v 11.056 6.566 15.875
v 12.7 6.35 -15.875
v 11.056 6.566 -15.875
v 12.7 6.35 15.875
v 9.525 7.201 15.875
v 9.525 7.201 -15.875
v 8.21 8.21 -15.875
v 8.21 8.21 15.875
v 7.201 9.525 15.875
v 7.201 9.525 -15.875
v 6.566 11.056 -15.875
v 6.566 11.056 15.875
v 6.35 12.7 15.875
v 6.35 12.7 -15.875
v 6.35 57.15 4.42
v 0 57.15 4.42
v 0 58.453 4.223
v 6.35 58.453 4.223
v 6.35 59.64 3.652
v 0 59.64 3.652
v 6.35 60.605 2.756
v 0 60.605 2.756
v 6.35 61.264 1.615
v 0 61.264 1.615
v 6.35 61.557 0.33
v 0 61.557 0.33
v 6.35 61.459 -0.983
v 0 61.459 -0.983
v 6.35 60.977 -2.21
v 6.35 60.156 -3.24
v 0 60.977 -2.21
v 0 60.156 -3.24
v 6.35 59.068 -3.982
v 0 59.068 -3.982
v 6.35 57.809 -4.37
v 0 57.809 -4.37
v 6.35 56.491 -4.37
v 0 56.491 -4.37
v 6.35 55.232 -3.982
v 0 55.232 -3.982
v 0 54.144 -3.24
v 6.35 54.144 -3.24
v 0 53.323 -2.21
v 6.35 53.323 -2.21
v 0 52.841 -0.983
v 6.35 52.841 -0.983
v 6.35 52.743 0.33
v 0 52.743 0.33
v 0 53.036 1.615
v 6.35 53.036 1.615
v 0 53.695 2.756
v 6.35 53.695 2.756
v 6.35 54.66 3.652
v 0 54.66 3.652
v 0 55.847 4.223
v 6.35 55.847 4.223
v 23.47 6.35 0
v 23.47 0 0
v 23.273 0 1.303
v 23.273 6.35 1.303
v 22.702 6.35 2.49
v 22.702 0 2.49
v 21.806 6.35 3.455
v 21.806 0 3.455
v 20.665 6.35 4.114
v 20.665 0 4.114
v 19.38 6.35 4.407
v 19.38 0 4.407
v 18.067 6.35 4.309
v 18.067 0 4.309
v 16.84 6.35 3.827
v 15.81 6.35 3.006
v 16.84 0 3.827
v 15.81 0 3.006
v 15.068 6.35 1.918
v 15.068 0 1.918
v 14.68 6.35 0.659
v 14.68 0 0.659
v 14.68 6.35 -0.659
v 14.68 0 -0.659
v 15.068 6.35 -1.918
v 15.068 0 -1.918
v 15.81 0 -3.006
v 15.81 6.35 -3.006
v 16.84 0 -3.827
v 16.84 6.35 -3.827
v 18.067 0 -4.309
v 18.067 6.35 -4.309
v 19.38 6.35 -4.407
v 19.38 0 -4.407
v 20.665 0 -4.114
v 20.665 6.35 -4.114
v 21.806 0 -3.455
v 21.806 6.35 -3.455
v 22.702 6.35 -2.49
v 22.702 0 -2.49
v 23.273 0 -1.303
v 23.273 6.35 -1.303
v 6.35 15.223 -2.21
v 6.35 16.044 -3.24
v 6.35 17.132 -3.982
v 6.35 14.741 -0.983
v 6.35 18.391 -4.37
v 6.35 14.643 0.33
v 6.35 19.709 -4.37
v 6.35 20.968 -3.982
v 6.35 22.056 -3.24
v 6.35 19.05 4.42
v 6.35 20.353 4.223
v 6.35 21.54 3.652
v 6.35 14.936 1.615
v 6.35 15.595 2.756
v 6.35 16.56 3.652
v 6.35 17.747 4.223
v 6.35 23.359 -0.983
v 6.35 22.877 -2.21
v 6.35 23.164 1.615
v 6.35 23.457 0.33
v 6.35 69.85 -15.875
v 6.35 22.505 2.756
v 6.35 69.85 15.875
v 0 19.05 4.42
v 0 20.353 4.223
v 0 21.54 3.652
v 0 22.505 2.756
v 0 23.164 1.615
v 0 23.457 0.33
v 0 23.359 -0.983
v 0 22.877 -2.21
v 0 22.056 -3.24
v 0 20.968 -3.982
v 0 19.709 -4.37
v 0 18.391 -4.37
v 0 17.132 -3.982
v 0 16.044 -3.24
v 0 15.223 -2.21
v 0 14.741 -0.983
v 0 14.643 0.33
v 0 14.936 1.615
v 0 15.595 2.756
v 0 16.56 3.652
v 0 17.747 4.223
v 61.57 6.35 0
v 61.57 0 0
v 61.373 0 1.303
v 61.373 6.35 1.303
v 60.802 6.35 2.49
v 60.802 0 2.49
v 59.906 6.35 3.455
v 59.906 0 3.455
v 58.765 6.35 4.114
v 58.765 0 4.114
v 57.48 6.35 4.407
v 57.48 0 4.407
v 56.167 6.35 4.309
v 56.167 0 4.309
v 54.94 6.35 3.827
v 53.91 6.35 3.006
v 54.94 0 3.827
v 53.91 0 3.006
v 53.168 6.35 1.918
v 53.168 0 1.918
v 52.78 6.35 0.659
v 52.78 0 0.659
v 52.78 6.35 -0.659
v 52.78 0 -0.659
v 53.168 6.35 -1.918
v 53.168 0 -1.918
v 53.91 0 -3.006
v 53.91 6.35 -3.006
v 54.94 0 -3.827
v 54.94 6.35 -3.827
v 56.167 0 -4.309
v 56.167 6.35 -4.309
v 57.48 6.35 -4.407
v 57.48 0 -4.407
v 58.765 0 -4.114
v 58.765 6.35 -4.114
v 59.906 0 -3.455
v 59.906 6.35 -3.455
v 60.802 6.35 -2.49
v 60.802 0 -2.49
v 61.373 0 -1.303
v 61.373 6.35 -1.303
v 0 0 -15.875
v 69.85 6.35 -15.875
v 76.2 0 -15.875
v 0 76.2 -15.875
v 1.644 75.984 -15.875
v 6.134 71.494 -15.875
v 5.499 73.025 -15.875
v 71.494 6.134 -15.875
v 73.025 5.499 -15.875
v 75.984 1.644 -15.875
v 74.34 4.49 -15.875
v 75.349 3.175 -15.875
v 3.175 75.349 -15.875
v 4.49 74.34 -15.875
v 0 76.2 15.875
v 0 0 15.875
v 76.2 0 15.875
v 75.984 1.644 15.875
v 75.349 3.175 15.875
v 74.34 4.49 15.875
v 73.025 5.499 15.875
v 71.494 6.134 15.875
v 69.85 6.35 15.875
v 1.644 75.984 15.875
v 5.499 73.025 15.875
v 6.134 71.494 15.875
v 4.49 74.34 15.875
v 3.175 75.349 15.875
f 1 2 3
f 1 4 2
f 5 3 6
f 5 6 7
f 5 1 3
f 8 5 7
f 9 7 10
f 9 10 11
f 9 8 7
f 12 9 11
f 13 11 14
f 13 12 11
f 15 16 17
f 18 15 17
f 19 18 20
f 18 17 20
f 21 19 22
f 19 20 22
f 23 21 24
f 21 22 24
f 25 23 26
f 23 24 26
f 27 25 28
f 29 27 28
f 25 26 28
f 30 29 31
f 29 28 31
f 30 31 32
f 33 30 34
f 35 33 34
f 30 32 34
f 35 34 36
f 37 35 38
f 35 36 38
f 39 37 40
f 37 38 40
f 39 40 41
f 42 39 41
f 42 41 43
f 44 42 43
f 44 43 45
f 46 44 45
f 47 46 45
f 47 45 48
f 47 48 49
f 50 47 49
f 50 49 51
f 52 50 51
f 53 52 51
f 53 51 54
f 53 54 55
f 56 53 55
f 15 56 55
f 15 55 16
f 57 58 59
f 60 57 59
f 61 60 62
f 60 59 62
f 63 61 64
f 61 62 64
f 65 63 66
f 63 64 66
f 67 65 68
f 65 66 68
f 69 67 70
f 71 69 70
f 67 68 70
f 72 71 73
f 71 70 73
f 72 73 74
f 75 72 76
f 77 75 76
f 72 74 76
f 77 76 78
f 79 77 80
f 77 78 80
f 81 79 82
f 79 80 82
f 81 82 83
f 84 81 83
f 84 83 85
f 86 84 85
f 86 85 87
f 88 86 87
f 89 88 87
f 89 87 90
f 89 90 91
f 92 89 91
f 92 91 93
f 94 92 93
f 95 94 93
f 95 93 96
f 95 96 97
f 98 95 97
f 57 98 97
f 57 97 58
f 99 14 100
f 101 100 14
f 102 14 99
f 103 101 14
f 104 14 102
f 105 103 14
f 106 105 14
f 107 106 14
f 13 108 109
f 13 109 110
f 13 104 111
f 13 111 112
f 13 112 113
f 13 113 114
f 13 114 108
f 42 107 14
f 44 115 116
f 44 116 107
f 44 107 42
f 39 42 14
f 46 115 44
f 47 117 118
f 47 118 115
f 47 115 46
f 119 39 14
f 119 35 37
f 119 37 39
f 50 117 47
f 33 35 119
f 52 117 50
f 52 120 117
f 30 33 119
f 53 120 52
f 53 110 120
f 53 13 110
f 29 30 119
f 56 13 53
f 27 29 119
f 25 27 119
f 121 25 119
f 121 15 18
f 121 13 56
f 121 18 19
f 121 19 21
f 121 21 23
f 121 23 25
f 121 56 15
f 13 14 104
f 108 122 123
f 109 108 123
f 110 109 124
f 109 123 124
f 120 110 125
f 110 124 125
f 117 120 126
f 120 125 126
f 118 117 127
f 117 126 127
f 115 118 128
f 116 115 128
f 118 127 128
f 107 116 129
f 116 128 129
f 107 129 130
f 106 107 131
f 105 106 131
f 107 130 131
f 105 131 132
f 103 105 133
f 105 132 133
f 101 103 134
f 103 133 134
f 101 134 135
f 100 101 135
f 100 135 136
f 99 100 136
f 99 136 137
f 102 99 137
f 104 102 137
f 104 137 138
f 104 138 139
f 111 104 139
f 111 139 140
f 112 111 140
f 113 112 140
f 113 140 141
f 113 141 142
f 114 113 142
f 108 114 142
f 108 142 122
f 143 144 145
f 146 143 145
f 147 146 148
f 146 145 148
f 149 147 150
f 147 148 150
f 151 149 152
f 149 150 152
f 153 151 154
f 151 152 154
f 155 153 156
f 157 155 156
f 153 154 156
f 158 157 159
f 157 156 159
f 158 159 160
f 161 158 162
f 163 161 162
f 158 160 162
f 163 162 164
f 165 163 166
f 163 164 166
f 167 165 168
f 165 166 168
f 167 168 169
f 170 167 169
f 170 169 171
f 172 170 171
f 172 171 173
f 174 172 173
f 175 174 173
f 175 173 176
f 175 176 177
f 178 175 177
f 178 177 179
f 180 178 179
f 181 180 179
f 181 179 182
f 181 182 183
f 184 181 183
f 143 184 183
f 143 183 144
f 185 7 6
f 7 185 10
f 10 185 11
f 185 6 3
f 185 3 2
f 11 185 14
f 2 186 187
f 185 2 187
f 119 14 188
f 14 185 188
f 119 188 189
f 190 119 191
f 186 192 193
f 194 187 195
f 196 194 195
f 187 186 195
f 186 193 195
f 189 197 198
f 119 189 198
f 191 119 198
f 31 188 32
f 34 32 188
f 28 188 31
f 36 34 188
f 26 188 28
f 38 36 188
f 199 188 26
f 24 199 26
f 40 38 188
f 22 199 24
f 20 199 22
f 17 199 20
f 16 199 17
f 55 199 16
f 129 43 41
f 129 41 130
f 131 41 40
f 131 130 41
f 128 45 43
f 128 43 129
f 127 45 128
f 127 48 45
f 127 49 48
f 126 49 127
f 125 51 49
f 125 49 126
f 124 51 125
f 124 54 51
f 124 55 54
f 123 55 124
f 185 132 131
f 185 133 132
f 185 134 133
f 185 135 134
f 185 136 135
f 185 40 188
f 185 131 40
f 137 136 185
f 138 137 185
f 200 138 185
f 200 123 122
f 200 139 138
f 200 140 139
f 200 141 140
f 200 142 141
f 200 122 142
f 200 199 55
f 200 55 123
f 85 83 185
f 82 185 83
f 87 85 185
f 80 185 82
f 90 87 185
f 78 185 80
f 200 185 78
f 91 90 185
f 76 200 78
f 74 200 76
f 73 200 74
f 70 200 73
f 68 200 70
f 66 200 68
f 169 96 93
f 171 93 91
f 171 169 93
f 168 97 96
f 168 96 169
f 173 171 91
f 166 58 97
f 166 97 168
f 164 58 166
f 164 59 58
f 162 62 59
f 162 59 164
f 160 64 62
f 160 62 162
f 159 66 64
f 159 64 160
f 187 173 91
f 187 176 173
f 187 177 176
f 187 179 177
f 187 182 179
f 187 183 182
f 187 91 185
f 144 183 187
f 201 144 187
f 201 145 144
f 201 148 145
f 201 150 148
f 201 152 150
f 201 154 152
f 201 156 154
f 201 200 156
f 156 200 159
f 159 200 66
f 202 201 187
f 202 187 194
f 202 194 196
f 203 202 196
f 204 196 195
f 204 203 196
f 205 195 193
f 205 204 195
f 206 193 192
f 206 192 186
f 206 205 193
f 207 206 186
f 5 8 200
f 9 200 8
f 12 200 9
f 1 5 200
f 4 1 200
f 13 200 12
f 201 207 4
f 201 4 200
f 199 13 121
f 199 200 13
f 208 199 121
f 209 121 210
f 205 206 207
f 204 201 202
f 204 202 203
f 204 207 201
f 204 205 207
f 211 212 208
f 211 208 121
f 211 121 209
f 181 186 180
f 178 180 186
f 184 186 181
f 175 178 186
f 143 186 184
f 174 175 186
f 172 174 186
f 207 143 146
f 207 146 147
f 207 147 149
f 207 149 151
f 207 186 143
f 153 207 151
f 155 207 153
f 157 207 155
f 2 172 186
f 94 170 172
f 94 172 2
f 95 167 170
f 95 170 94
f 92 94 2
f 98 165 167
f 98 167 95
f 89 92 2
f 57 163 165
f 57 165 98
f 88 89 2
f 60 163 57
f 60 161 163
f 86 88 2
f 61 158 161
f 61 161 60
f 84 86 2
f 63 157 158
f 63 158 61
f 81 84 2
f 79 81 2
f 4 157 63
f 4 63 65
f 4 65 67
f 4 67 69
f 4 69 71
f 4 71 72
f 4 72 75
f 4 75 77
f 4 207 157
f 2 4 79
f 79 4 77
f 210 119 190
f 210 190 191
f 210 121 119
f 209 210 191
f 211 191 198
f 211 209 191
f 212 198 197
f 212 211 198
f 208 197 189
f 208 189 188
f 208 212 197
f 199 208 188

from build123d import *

# Parameters (mm, degrees)
BOSS_EXTRUDE1_DEPTH      = 15.875
S_0_348_DIAMETER_HOLE1_D = 8.8392
S_0_348_DIAMETER_HOLE2_D = 8.8392
FILLET1_R                = 6.35


with BuildPart() as part:
    # Sketch1 → Boss-Extrude1 (new, symmetric)
    with BuildSketch(Plane.XY):
        with BuildLine():
            Line((0, 0), (76.2, 0))
            ThreePointArc((76.2, 0), (74.340128061, 4.490128061), (69.85, 6.35))
            Line((69.85, 6.35), (6.35, 6.35))
            Line((6.35, 6.35), (6.35, 69.85))
            ThreePointArc((6.35, 69.85), (4.490128061, 74.340128061), (0, 76.2))
            Line((0, 76.2), (0, 0))
        make_face()
    extrude(amount=BOSS_EXTRUDE1_DEPTH, both=True)

    # S (0.348) Diameter Hole1 (through all)
    with Locations(Plane(origin=(6.35, 0, 0), x_dir=(0, 0, -1), z_dir=(1, 0, 0))):
        with Locations((0, 57.15), (0, 19.05)):
            Hole(S_0_348_DIAMETER_HOLE1_D / 2)

    # S (0.348) Diameter Hole2 (through all)
    with Locations(Plane(origin=(0, 6.35, 0), x_dir=(-1, 0, 0), z_dir=(0, 1, 0))):
        with Locations((-19.05, 0), (-57.15, 0)):
            Hole(S_0_348_DIAMETER_HOLE2_D / 2)

    # Fillet1
    fillet1_edges = [part.edges().sort_by_distance(p)[0] for p in [
        (6.35, 6.35, 0),
    ]]
    fillet(fillet1_edges, radius=FILLET1_R)


solid = part.part
